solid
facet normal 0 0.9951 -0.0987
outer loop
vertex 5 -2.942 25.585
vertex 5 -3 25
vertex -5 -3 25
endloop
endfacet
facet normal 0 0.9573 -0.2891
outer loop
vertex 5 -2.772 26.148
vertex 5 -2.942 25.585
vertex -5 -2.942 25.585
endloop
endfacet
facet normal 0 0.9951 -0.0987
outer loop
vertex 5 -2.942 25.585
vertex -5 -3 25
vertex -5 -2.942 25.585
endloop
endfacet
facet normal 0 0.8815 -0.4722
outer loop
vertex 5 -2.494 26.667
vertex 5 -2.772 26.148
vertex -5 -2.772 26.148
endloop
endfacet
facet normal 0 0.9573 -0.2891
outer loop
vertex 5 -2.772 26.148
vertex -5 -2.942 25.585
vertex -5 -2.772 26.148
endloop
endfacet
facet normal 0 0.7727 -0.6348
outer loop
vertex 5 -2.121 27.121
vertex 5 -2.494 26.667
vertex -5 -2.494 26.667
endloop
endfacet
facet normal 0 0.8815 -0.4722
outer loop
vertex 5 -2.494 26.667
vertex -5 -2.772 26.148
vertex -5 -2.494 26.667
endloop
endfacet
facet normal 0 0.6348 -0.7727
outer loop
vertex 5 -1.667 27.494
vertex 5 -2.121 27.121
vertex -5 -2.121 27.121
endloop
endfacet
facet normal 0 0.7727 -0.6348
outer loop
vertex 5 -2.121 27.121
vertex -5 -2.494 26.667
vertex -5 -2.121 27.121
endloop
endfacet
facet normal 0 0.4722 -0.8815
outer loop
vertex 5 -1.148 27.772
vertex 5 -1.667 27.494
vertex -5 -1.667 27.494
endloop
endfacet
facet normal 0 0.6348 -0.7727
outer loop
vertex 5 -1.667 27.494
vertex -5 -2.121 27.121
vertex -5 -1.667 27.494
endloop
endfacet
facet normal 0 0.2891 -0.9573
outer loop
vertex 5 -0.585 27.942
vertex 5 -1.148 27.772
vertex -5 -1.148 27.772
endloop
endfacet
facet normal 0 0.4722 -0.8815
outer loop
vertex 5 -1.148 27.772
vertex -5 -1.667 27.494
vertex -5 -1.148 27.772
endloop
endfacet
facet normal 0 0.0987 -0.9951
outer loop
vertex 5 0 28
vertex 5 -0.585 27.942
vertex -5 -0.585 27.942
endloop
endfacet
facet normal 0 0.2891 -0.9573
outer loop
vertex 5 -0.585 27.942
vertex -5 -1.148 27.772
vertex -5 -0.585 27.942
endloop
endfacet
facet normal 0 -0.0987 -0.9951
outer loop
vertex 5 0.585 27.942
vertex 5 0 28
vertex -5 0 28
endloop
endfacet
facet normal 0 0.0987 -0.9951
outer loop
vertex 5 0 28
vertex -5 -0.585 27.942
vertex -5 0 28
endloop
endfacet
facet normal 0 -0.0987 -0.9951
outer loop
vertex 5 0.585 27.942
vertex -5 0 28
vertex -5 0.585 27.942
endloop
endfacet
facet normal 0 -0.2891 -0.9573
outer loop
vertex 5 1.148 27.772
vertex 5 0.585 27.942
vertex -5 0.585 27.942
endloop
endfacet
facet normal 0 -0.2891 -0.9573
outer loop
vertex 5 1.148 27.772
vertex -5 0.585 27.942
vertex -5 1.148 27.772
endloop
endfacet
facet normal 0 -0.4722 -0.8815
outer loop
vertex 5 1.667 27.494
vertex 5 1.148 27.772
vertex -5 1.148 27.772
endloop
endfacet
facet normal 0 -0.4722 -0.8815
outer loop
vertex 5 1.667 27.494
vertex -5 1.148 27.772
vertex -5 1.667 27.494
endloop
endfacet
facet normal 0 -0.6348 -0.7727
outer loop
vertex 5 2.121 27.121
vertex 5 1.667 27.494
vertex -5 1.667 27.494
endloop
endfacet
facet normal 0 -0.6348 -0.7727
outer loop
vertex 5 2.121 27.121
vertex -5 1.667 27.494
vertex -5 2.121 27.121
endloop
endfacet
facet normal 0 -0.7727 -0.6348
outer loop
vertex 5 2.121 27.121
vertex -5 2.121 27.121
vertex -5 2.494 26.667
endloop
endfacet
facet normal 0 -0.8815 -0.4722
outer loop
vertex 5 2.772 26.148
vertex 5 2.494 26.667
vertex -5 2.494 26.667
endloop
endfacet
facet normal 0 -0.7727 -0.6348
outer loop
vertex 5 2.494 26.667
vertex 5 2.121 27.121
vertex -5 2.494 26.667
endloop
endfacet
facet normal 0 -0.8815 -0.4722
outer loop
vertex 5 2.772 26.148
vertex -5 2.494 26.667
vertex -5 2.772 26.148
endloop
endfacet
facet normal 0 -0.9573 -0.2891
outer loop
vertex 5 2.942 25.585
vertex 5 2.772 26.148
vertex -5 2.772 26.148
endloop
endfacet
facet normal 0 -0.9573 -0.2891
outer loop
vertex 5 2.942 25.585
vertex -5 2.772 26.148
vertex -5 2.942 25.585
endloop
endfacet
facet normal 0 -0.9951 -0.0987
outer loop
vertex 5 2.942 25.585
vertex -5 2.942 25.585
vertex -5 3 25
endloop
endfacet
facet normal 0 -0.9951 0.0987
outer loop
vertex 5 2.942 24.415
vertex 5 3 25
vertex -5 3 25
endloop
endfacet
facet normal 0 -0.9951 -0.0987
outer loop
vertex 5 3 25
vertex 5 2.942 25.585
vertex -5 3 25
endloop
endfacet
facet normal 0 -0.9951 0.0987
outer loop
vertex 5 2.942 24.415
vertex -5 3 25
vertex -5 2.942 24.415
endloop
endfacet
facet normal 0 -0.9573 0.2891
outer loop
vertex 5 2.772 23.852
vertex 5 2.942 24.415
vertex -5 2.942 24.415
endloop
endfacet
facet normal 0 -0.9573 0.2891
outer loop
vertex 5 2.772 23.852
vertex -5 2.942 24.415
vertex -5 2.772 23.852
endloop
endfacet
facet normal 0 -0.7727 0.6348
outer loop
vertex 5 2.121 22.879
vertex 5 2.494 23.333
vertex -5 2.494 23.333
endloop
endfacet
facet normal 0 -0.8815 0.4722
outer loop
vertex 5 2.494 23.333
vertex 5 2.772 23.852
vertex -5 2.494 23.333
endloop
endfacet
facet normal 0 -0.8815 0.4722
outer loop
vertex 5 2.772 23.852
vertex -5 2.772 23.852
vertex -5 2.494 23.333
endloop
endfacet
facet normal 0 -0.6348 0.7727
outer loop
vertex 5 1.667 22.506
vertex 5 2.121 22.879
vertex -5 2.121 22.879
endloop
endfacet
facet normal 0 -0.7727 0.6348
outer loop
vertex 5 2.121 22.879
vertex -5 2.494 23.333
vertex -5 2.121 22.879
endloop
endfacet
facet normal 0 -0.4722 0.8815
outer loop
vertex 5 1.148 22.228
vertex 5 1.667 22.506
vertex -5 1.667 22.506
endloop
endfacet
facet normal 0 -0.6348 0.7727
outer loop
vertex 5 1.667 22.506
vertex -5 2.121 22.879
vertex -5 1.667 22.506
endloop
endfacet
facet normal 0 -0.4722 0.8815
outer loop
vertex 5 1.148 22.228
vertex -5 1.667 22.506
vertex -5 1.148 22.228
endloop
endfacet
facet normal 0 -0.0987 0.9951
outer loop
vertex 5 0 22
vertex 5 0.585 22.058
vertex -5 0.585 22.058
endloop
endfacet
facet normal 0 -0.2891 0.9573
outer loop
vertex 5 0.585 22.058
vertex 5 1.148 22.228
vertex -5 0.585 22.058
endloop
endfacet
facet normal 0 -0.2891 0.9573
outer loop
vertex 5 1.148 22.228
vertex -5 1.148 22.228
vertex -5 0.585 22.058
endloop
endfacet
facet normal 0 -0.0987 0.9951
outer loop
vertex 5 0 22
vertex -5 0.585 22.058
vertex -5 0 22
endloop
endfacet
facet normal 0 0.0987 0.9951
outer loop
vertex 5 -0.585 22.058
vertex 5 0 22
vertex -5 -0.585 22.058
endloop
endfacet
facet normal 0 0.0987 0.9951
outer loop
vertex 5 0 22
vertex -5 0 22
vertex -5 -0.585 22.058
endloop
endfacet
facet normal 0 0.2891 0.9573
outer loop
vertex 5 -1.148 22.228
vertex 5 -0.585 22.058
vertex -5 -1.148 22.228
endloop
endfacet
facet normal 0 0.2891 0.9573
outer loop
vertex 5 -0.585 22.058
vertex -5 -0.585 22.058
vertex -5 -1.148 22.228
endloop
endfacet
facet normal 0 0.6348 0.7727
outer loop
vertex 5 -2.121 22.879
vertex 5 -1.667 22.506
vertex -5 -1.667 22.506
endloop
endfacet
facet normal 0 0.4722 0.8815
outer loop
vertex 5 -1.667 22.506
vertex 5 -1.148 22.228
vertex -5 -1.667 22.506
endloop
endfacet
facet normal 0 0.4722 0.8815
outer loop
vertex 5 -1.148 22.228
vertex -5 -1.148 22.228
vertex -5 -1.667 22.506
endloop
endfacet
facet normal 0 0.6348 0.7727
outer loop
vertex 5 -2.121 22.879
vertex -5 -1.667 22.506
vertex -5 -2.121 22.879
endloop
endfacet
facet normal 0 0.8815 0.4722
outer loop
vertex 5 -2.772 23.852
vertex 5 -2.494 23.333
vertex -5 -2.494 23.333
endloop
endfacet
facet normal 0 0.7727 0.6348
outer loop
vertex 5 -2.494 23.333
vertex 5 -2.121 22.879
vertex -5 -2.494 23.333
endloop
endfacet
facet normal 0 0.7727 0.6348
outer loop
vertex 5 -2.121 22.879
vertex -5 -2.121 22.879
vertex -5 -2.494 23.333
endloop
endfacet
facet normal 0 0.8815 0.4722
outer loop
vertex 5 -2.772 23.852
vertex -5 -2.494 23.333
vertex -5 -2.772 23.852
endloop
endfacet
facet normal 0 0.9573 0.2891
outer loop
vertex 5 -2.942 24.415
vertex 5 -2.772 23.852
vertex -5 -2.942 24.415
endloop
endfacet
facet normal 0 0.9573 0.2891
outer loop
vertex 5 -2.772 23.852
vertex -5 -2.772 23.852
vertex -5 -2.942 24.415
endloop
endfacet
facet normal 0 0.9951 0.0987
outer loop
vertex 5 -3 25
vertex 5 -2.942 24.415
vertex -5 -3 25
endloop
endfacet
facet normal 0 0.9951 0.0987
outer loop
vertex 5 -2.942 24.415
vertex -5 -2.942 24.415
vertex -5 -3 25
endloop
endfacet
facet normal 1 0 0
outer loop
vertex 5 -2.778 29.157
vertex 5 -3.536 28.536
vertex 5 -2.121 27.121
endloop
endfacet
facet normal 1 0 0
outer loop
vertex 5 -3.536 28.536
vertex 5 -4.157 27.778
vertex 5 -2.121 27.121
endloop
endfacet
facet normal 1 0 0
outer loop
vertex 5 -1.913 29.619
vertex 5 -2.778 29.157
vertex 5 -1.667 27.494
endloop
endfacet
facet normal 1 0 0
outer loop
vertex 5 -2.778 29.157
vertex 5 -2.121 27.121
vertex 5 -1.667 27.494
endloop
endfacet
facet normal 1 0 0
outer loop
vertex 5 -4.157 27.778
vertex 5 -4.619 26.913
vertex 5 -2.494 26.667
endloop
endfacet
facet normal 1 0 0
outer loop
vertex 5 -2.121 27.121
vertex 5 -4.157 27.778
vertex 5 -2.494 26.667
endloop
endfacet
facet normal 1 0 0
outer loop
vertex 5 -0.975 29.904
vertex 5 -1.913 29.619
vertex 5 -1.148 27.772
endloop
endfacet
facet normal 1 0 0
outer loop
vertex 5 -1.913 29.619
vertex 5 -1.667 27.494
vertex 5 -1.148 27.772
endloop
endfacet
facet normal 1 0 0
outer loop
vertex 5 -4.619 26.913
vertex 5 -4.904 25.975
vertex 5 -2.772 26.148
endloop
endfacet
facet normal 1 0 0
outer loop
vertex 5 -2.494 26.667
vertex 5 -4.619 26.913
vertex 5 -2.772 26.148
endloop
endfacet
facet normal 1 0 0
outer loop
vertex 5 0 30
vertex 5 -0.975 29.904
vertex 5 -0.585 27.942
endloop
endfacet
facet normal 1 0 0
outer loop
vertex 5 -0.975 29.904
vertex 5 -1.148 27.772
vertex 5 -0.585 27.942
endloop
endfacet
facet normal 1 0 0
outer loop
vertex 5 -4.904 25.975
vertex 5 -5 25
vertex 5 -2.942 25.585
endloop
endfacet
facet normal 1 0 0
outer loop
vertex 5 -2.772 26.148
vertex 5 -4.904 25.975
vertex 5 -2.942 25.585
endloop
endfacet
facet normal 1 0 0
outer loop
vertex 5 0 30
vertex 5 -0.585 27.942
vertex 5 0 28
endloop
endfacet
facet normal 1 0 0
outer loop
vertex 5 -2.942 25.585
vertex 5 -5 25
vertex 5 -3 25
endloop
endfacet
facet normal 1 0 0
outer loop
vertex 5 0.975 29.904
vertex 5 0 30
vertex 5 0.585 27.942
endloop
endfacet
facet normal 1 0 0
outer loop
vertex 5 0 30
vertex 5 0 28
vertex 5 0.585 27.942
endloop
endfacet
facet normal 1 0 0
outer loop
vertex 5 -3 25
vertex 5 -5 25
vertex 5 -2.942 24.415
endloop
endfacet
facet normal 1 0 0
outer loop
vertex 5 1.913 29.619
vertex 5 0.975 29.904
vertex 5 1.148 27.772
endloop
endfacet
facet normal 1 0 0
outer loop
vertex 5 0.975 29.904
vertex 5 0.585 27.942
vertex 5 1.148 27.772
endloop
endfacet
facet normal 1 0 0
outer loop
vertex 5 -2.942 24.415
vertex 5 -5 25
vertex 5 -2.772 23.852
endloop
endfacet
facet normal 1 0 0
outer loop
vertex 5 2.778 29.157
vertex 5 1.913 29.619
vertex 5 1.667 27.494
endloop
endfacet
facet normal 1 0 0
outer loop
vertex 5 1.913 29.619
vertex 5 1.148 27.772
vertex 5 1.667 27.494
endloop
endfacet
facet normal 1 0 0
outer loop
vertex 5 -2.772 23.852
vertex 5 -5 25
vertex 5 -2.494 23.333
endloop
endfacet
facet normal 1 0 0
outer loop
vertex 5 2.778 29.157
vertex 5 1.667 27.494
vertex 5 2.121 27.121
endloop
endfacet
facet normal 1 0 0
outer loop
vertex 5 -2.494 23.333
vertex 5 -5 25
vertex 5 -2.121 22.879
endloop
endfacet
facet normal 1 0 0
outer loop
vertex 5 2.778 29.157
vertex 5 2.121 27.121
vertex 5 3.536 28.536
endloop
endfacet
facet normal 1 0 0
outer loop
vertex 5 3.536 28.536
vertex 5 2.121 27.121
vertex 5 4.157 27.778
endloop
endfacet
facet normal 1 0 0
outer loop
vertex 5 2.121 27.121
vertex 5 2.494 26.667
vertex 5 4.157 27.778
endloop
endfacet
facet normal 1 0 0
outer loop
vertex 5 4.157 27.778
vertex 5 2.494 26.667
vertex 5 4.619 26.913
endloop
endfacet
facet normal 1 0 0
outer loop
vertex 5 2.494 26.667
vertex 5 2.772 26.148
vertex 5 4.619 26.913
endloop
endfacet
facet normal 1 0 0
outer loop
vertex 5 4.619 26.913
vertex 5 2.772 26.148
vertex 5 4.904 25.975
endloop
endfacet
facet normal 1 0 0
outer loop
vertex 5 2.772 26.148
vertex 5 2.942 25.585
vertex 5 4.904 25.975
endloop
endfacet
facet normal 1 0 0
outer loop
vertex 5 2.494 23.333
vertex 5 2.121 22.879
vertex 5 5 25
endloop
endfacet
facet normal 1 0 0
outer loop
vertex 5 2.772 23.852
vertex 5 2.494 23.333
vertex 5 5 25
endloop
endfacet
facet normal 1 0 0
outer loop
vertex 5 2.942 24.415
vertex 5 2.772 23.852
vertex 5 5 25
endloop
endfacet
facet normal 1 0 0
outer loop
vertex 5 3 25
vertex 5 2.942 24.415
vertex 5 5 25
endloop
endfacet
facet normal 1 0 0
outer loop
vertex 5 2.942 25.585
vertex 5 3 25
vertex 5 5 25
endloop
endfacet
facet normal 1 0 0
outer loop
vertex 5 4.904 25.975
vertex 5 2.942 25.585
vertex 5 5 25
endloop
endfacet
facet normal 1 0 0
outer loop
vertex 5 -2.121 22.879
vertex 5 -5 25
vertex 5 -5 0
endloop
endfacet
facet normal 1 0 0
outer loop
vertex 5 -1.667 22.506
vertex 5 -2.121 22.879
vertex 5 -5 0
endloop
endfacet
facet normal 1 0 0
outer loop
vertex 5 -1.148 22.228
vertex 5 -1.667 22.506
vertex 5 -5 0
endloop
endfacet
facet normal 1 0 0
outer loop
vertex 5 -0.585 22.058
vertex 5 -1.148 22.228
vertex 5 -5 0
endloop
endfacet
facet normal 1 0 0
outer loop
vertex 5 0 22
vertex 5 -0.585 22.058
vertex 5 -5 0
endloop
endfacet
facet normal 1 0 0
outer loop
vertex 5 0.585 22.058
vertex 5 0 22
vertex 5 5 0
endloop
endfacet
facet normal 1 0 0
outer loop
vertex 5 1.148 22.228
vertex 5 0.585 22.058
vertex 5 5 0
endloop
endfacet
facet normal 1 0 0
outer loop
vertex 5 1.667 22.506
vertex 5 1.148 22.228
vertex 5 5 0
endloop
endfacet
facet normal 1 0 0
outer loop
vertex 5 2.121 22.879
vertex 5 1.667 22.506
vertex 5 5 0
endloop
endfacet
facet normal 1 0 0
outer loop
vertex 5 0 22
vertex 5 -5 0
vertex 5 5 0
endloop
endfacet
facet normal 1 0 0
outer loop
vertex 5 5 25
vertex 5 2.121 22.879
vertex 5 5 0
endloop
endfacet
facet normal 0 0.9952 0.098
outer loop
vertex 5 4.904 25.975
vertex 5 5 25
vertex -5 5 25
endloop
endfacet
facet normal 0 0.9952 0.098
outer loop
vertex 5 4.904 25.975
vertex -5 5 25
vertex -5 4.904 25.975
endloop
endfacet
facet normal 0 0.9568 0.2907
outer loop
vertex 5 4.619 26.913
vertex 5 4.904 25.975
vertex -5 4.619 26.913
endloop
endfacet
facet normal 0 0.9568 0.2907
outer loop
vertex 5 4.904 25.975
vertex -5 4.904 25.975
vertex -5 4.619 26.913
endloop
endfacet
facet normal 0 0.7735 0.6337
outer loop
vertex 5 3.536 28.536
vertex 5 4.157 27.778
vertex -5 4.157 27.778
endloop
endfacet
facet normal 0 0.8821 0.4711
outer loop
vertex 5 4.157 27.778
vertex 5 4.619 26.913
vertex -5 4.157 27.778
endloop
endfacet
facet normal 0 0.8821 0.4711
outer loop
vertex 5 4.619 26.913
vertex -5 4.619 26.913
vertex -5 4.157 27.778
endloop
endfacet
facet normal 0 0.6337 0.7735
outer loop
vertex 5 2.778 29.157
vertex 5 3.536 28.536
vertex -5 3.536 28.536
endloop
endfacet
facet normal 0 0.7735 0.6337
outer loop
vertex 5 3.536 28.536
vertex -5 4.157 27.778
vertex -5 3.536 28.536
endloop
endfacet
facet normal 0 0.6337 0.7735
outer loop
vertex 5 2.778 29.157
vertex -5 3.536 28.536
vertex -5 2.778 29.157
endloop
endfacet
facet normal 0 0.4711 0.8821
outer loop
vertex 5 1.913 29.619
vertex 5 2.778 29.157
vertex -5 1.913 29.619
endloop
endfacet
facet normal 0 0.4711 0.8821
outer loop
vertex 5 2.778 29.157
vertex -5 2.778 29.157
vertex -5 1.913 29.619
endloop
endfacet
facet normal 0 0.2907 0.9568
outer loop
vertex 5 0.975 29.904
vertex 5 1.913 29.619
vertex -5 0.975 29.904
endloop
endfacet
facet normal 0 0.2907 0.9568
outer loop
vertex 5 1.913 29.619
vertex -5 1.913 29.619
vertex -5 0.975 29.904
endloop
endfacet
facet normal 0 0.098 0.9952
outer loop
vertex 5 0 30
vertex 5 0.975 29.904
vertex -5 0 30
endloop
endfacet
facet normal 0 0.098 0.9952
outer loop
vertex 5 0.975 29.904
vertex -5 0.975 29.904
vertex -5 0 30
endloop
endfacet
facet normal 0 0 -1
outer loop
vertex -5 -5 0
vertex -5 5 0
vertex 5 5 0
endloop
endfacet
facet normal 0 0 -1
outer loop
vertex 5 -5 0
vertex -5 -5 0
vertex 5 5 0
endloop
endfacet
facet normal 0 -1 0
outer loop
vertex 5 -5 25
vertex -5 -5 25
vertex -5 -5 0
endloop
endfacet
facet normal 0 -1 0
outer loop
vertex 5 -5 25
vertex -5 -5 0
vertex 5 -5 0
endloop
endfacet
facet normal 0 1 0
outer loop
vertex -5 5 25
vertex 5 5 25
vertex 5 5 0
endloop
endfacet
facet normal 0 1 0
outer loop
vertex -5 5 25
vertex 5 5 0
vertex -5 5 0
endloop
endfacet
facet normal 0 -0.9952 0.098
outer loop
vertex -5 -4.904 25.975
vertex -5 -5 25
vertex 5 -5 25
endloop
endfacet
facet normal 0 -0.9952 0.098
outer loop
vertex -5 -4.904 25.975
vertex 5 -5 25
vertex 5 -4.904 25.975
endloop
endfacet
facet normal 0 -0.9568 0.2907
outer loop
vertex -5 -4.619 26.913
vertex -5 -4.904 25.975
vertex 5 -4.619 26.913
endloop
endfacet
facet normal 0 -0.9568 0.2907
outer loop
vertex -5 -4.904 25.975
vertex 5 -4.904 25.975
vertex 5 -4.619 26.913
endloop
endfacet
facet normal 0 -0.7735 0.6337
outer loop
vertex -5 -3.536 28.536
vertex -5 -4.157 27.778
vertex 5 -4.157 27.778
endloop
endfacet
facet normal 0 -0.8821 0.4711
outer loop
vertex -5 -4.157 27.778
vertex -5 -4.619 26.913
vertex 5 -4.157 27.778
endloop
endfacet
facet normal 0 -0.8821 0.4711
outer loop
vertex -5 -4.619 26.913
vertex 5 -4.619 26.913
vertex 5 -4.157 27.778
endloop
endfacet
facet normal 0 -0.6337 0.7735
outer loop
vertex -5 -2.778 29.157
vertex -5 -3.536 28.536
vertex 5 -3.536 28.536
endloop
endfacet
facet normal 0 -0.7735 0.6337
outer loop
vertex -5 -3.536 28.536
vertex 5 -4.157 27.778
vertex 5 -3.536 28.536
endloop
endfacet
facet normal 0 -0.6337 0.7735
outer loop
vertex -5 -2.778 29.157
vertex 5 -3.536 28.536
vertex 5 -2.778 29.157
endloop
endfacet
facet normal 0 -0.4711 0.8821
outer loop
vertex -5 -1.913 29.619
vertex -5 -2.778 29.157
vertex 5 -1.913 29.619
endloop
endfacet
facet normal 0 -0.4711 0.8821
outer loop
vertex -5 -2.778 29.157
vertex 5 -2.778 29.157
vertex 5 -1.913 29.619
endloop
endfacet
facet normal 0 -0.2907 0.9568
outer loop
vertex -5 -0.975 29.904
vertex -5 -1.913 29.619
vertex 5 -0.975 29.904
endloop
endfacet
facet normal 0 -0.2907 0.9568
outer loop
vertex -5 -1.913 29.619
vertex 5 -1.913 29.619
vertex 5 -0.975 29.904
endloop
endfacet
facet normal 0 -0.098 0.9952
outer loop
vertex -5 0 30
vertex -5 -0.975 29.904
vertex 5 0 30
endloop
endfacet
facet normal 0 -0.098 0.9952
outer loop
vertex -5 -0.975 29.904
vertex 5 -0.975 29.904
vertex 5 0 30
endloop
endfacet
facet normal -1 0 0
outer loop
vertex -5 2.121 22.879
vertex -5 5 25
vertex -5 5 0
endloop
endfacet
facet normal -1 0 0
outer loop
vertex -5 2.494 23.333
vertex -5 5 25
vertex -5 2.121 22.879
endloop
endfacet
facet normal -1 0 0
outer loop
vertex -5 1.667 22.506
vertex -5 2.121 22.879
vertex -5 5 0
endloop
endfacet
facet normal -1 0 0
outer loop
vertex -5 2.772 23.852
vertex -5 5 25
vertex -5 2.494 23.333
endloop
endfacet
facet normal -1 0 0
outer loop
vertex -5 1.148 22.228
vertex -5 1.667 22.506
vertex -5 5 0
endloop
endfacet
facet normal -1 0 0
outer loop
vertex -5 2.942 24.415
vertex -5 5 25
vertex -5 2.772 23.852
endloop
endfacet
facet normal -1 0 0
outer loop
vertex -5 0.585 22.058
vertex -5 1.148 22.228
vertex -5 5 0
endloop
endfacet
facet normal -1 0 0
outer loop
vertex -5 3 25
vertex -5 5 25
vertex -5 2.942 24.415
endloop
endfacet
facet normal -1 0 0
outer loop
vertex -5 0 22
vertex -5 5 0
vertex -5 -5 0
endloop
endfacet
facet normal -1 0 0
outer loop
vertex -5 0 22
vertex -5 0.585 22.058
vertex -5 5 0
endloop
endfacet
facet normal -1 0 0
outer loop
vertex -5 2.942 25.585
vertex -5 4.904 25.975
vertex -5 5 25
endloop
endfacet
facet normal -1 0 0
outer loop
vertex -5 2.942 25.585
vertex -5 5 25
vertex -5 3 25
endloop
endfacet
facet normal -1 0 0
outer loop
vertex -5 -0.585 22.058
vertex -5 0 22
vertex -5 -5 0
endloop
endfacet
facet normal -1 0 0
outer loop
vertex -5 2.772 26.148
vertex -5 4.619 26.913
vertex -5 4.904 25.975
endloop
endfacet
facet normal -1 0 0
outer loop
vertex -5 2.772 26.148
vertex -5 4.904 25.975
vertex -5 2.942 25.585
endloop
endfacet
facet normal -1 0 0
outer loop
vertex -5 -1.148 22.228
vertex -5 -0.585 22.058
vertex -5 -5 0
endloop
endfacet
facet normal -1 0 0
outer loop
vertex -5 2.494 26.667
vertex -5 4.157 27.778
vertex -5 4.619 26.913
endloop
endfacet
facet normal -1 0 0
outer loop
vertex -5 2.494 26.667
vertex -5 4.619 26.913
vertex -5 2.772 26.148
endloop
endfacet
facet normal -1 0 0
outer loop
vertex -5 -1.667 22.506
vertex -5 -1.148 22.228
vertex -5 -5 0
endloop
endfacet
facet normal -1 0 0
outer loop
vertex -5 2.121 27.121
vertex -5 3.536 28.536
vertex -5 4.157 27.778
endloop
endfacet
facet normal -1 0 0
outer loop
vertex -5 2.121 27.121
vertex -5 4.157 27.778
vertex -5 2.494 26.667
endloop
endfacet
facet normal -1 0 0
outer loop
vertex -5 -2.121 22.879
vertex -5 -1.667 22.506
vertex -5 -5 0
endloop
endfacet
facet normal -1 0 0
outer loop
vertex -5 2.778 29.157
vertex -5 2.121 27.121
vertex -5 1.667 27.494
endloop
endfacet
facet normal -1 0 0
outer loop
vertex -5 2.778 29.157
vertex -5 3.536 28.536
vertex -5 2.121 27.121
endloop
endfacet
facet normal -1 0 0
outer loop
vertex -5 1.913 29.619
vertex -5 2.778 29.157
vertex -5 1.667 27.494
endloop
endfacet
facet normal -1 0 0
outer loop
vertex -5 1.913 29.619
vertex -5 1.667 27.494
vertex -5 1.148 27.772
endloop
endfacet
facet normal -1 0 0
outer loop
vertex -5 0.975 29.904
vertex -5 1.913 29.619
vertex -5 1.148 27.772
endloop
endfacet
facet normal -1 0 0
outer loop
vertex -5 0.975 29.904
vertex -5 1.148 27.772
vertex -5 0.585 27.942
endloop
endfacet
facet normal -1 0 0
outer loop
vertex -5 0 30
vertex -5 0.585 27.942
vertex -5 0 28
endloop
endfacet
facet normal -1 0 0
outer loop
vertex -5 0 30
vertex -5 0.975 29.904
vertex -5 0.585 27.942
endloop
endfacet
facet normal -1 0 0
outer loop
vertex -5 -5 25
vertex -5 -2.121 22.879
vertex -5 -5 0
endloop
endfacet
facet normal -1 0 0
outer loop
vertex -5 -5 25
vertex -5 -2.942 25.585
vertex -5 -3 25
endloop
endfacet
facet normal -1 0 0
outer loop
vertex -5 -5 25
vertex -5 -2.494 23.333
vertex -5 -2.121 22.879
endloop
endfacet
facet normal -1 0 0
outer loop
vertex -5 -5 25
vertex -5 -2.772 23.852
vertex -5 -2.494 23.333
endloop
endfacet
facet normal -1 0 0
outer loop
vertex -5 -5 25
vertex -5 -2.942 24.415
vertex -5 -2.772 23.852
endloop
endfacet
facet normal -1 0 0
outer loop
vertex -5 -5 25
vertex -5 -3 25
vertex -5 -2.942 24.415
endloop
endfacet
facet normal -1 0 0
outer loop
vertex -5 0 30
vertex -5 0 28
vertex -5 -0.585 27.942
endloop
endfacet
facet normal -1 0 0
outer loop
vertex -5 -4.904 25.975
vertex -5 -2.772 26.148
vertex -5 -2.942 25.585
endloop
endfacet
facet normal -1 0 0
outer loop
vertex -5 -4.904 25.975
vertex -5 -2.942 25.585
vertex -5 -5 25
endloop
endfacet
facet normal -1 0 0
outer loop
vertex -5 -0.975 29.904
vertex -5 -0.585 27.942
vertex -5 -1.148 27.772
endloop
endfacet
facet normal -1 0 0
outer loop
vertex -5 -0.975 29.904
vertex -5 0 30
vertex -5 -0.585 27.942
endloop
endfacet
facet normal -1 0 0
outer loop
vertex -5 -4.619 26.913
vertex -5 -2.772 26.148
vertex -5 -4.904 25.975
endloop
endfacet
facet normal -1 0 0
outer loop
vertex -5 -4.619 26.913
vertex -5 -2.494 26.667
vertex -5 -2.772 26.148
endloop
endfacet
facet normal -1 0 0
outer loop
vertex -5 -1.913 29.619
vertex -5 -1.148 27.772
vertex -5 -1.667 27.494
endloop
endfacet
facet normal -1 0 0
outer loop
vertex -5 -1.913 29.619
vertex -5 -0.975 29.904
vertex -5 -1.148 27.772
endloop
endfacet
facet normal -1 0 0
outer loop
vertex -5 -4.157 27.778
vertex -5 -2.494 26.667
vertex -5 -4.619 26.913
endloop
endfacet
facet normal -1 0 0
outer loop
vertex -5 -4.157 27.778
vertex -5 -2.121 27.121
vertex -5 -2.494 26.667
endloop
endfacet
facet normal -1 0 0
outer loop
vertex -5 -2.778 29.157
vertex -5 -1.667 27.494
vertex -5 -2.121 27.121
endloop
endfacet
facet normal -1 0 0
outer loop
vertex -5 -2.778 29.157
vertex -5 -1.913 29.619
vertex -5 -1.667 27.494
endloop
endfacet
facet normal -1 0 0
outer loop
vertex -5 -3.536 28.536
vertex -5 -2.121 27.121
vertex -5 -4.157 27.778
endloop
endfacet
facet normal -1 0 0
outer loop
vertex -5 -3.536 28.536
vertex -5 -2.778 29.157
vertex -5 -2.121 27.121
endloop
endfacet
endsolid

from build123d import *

# Parameters (mm, degrees)
F0_W     = 10
F0_H     = 10
F1_DEPTH = 20
F2_W     = 2
F2_H     = 10
F2_W_2   = 10
F3_DEPTH = 10
F6_R     = 4.99999
F5_W     = 10
F5_H     = 10
F5_R     = 3
F7_DEPTH = 2
F4_W     = 10
F4_H     = 10
F4_R     = 3
F8_DEPTH = 2
F9_DEPTH = 14.001


# Not quite as in the source:
# - a fillet or chamfer is up to 0.001 mm smaller than in the source, because OpenCascade refuses the exact size


with BuildPart() as f1:
    # F0 (on Top) → F1 (new body)
    with BuildSketch(Plane.XY):
        Rectangle(F0_W, F0_H)
    extrude(amount=F1_DEPTH)

    # F2 (on face) → F3 (join)
    with BuildSketch(Plane.XY.offset(20)):
        with Locations((-6, 0)):
            Rectangle(F2_W, F2_H)
        Rectangle(F2_W_2, F2_H)
        with Locations((6, 0)):
            Rectangle(F2_W, F2_H)
    extrude(amount=F3_DEPTH)

    # F6 (radius 5 in the source; OpenCascade refuses exactly that, so slightly less here)
    f6_edges = [f1.edges().sort_by_distance(p)[0] for p in [
        (0, 5, 30),
        (0, -5, 30),
    ]]
    fillet(f6_edges, radius=F6_R)

    # F5 (on face) → F7 (cut)
    with BuildSketch(Plane.YZ.offset(7)):
        with Locations((0, 25)):
            Rectangle(F5_W, F5_H)
        with Locations((0, 25)):
            Circle(F5_R, mode=Mode.SUBTRACT)
    extrude(amount=-F7_DEPTH, mode=Mode.SUBTRACT)

    # F4 (on face) → F8 (cut)
    with BuildSketch(Plane(origin=(-7, 0, 0), x_dir=(0, -1, 0), z_dir=(-1, 0, 0))):
        with Locations((0, 25)):
            Rectangle(F4_W, F4_H)
        with Locations((0, 25)):
            Circle(F4_R, mode=Mode.SUBTRACT)
    extrude(amount=-F8_DEPTH, mode=Mode.SUBTRACT)

    # F9 (cut, through all): a face of the model
    f9_faces = [f1.faces().sort_by_distance(p)[0] for p in [
        (-7, 0, 25),
    ]]
    extrude(f9_faces, amount=-F9_DEPTH, mode=Mode.SUBTRACT)


solid = f1.part
